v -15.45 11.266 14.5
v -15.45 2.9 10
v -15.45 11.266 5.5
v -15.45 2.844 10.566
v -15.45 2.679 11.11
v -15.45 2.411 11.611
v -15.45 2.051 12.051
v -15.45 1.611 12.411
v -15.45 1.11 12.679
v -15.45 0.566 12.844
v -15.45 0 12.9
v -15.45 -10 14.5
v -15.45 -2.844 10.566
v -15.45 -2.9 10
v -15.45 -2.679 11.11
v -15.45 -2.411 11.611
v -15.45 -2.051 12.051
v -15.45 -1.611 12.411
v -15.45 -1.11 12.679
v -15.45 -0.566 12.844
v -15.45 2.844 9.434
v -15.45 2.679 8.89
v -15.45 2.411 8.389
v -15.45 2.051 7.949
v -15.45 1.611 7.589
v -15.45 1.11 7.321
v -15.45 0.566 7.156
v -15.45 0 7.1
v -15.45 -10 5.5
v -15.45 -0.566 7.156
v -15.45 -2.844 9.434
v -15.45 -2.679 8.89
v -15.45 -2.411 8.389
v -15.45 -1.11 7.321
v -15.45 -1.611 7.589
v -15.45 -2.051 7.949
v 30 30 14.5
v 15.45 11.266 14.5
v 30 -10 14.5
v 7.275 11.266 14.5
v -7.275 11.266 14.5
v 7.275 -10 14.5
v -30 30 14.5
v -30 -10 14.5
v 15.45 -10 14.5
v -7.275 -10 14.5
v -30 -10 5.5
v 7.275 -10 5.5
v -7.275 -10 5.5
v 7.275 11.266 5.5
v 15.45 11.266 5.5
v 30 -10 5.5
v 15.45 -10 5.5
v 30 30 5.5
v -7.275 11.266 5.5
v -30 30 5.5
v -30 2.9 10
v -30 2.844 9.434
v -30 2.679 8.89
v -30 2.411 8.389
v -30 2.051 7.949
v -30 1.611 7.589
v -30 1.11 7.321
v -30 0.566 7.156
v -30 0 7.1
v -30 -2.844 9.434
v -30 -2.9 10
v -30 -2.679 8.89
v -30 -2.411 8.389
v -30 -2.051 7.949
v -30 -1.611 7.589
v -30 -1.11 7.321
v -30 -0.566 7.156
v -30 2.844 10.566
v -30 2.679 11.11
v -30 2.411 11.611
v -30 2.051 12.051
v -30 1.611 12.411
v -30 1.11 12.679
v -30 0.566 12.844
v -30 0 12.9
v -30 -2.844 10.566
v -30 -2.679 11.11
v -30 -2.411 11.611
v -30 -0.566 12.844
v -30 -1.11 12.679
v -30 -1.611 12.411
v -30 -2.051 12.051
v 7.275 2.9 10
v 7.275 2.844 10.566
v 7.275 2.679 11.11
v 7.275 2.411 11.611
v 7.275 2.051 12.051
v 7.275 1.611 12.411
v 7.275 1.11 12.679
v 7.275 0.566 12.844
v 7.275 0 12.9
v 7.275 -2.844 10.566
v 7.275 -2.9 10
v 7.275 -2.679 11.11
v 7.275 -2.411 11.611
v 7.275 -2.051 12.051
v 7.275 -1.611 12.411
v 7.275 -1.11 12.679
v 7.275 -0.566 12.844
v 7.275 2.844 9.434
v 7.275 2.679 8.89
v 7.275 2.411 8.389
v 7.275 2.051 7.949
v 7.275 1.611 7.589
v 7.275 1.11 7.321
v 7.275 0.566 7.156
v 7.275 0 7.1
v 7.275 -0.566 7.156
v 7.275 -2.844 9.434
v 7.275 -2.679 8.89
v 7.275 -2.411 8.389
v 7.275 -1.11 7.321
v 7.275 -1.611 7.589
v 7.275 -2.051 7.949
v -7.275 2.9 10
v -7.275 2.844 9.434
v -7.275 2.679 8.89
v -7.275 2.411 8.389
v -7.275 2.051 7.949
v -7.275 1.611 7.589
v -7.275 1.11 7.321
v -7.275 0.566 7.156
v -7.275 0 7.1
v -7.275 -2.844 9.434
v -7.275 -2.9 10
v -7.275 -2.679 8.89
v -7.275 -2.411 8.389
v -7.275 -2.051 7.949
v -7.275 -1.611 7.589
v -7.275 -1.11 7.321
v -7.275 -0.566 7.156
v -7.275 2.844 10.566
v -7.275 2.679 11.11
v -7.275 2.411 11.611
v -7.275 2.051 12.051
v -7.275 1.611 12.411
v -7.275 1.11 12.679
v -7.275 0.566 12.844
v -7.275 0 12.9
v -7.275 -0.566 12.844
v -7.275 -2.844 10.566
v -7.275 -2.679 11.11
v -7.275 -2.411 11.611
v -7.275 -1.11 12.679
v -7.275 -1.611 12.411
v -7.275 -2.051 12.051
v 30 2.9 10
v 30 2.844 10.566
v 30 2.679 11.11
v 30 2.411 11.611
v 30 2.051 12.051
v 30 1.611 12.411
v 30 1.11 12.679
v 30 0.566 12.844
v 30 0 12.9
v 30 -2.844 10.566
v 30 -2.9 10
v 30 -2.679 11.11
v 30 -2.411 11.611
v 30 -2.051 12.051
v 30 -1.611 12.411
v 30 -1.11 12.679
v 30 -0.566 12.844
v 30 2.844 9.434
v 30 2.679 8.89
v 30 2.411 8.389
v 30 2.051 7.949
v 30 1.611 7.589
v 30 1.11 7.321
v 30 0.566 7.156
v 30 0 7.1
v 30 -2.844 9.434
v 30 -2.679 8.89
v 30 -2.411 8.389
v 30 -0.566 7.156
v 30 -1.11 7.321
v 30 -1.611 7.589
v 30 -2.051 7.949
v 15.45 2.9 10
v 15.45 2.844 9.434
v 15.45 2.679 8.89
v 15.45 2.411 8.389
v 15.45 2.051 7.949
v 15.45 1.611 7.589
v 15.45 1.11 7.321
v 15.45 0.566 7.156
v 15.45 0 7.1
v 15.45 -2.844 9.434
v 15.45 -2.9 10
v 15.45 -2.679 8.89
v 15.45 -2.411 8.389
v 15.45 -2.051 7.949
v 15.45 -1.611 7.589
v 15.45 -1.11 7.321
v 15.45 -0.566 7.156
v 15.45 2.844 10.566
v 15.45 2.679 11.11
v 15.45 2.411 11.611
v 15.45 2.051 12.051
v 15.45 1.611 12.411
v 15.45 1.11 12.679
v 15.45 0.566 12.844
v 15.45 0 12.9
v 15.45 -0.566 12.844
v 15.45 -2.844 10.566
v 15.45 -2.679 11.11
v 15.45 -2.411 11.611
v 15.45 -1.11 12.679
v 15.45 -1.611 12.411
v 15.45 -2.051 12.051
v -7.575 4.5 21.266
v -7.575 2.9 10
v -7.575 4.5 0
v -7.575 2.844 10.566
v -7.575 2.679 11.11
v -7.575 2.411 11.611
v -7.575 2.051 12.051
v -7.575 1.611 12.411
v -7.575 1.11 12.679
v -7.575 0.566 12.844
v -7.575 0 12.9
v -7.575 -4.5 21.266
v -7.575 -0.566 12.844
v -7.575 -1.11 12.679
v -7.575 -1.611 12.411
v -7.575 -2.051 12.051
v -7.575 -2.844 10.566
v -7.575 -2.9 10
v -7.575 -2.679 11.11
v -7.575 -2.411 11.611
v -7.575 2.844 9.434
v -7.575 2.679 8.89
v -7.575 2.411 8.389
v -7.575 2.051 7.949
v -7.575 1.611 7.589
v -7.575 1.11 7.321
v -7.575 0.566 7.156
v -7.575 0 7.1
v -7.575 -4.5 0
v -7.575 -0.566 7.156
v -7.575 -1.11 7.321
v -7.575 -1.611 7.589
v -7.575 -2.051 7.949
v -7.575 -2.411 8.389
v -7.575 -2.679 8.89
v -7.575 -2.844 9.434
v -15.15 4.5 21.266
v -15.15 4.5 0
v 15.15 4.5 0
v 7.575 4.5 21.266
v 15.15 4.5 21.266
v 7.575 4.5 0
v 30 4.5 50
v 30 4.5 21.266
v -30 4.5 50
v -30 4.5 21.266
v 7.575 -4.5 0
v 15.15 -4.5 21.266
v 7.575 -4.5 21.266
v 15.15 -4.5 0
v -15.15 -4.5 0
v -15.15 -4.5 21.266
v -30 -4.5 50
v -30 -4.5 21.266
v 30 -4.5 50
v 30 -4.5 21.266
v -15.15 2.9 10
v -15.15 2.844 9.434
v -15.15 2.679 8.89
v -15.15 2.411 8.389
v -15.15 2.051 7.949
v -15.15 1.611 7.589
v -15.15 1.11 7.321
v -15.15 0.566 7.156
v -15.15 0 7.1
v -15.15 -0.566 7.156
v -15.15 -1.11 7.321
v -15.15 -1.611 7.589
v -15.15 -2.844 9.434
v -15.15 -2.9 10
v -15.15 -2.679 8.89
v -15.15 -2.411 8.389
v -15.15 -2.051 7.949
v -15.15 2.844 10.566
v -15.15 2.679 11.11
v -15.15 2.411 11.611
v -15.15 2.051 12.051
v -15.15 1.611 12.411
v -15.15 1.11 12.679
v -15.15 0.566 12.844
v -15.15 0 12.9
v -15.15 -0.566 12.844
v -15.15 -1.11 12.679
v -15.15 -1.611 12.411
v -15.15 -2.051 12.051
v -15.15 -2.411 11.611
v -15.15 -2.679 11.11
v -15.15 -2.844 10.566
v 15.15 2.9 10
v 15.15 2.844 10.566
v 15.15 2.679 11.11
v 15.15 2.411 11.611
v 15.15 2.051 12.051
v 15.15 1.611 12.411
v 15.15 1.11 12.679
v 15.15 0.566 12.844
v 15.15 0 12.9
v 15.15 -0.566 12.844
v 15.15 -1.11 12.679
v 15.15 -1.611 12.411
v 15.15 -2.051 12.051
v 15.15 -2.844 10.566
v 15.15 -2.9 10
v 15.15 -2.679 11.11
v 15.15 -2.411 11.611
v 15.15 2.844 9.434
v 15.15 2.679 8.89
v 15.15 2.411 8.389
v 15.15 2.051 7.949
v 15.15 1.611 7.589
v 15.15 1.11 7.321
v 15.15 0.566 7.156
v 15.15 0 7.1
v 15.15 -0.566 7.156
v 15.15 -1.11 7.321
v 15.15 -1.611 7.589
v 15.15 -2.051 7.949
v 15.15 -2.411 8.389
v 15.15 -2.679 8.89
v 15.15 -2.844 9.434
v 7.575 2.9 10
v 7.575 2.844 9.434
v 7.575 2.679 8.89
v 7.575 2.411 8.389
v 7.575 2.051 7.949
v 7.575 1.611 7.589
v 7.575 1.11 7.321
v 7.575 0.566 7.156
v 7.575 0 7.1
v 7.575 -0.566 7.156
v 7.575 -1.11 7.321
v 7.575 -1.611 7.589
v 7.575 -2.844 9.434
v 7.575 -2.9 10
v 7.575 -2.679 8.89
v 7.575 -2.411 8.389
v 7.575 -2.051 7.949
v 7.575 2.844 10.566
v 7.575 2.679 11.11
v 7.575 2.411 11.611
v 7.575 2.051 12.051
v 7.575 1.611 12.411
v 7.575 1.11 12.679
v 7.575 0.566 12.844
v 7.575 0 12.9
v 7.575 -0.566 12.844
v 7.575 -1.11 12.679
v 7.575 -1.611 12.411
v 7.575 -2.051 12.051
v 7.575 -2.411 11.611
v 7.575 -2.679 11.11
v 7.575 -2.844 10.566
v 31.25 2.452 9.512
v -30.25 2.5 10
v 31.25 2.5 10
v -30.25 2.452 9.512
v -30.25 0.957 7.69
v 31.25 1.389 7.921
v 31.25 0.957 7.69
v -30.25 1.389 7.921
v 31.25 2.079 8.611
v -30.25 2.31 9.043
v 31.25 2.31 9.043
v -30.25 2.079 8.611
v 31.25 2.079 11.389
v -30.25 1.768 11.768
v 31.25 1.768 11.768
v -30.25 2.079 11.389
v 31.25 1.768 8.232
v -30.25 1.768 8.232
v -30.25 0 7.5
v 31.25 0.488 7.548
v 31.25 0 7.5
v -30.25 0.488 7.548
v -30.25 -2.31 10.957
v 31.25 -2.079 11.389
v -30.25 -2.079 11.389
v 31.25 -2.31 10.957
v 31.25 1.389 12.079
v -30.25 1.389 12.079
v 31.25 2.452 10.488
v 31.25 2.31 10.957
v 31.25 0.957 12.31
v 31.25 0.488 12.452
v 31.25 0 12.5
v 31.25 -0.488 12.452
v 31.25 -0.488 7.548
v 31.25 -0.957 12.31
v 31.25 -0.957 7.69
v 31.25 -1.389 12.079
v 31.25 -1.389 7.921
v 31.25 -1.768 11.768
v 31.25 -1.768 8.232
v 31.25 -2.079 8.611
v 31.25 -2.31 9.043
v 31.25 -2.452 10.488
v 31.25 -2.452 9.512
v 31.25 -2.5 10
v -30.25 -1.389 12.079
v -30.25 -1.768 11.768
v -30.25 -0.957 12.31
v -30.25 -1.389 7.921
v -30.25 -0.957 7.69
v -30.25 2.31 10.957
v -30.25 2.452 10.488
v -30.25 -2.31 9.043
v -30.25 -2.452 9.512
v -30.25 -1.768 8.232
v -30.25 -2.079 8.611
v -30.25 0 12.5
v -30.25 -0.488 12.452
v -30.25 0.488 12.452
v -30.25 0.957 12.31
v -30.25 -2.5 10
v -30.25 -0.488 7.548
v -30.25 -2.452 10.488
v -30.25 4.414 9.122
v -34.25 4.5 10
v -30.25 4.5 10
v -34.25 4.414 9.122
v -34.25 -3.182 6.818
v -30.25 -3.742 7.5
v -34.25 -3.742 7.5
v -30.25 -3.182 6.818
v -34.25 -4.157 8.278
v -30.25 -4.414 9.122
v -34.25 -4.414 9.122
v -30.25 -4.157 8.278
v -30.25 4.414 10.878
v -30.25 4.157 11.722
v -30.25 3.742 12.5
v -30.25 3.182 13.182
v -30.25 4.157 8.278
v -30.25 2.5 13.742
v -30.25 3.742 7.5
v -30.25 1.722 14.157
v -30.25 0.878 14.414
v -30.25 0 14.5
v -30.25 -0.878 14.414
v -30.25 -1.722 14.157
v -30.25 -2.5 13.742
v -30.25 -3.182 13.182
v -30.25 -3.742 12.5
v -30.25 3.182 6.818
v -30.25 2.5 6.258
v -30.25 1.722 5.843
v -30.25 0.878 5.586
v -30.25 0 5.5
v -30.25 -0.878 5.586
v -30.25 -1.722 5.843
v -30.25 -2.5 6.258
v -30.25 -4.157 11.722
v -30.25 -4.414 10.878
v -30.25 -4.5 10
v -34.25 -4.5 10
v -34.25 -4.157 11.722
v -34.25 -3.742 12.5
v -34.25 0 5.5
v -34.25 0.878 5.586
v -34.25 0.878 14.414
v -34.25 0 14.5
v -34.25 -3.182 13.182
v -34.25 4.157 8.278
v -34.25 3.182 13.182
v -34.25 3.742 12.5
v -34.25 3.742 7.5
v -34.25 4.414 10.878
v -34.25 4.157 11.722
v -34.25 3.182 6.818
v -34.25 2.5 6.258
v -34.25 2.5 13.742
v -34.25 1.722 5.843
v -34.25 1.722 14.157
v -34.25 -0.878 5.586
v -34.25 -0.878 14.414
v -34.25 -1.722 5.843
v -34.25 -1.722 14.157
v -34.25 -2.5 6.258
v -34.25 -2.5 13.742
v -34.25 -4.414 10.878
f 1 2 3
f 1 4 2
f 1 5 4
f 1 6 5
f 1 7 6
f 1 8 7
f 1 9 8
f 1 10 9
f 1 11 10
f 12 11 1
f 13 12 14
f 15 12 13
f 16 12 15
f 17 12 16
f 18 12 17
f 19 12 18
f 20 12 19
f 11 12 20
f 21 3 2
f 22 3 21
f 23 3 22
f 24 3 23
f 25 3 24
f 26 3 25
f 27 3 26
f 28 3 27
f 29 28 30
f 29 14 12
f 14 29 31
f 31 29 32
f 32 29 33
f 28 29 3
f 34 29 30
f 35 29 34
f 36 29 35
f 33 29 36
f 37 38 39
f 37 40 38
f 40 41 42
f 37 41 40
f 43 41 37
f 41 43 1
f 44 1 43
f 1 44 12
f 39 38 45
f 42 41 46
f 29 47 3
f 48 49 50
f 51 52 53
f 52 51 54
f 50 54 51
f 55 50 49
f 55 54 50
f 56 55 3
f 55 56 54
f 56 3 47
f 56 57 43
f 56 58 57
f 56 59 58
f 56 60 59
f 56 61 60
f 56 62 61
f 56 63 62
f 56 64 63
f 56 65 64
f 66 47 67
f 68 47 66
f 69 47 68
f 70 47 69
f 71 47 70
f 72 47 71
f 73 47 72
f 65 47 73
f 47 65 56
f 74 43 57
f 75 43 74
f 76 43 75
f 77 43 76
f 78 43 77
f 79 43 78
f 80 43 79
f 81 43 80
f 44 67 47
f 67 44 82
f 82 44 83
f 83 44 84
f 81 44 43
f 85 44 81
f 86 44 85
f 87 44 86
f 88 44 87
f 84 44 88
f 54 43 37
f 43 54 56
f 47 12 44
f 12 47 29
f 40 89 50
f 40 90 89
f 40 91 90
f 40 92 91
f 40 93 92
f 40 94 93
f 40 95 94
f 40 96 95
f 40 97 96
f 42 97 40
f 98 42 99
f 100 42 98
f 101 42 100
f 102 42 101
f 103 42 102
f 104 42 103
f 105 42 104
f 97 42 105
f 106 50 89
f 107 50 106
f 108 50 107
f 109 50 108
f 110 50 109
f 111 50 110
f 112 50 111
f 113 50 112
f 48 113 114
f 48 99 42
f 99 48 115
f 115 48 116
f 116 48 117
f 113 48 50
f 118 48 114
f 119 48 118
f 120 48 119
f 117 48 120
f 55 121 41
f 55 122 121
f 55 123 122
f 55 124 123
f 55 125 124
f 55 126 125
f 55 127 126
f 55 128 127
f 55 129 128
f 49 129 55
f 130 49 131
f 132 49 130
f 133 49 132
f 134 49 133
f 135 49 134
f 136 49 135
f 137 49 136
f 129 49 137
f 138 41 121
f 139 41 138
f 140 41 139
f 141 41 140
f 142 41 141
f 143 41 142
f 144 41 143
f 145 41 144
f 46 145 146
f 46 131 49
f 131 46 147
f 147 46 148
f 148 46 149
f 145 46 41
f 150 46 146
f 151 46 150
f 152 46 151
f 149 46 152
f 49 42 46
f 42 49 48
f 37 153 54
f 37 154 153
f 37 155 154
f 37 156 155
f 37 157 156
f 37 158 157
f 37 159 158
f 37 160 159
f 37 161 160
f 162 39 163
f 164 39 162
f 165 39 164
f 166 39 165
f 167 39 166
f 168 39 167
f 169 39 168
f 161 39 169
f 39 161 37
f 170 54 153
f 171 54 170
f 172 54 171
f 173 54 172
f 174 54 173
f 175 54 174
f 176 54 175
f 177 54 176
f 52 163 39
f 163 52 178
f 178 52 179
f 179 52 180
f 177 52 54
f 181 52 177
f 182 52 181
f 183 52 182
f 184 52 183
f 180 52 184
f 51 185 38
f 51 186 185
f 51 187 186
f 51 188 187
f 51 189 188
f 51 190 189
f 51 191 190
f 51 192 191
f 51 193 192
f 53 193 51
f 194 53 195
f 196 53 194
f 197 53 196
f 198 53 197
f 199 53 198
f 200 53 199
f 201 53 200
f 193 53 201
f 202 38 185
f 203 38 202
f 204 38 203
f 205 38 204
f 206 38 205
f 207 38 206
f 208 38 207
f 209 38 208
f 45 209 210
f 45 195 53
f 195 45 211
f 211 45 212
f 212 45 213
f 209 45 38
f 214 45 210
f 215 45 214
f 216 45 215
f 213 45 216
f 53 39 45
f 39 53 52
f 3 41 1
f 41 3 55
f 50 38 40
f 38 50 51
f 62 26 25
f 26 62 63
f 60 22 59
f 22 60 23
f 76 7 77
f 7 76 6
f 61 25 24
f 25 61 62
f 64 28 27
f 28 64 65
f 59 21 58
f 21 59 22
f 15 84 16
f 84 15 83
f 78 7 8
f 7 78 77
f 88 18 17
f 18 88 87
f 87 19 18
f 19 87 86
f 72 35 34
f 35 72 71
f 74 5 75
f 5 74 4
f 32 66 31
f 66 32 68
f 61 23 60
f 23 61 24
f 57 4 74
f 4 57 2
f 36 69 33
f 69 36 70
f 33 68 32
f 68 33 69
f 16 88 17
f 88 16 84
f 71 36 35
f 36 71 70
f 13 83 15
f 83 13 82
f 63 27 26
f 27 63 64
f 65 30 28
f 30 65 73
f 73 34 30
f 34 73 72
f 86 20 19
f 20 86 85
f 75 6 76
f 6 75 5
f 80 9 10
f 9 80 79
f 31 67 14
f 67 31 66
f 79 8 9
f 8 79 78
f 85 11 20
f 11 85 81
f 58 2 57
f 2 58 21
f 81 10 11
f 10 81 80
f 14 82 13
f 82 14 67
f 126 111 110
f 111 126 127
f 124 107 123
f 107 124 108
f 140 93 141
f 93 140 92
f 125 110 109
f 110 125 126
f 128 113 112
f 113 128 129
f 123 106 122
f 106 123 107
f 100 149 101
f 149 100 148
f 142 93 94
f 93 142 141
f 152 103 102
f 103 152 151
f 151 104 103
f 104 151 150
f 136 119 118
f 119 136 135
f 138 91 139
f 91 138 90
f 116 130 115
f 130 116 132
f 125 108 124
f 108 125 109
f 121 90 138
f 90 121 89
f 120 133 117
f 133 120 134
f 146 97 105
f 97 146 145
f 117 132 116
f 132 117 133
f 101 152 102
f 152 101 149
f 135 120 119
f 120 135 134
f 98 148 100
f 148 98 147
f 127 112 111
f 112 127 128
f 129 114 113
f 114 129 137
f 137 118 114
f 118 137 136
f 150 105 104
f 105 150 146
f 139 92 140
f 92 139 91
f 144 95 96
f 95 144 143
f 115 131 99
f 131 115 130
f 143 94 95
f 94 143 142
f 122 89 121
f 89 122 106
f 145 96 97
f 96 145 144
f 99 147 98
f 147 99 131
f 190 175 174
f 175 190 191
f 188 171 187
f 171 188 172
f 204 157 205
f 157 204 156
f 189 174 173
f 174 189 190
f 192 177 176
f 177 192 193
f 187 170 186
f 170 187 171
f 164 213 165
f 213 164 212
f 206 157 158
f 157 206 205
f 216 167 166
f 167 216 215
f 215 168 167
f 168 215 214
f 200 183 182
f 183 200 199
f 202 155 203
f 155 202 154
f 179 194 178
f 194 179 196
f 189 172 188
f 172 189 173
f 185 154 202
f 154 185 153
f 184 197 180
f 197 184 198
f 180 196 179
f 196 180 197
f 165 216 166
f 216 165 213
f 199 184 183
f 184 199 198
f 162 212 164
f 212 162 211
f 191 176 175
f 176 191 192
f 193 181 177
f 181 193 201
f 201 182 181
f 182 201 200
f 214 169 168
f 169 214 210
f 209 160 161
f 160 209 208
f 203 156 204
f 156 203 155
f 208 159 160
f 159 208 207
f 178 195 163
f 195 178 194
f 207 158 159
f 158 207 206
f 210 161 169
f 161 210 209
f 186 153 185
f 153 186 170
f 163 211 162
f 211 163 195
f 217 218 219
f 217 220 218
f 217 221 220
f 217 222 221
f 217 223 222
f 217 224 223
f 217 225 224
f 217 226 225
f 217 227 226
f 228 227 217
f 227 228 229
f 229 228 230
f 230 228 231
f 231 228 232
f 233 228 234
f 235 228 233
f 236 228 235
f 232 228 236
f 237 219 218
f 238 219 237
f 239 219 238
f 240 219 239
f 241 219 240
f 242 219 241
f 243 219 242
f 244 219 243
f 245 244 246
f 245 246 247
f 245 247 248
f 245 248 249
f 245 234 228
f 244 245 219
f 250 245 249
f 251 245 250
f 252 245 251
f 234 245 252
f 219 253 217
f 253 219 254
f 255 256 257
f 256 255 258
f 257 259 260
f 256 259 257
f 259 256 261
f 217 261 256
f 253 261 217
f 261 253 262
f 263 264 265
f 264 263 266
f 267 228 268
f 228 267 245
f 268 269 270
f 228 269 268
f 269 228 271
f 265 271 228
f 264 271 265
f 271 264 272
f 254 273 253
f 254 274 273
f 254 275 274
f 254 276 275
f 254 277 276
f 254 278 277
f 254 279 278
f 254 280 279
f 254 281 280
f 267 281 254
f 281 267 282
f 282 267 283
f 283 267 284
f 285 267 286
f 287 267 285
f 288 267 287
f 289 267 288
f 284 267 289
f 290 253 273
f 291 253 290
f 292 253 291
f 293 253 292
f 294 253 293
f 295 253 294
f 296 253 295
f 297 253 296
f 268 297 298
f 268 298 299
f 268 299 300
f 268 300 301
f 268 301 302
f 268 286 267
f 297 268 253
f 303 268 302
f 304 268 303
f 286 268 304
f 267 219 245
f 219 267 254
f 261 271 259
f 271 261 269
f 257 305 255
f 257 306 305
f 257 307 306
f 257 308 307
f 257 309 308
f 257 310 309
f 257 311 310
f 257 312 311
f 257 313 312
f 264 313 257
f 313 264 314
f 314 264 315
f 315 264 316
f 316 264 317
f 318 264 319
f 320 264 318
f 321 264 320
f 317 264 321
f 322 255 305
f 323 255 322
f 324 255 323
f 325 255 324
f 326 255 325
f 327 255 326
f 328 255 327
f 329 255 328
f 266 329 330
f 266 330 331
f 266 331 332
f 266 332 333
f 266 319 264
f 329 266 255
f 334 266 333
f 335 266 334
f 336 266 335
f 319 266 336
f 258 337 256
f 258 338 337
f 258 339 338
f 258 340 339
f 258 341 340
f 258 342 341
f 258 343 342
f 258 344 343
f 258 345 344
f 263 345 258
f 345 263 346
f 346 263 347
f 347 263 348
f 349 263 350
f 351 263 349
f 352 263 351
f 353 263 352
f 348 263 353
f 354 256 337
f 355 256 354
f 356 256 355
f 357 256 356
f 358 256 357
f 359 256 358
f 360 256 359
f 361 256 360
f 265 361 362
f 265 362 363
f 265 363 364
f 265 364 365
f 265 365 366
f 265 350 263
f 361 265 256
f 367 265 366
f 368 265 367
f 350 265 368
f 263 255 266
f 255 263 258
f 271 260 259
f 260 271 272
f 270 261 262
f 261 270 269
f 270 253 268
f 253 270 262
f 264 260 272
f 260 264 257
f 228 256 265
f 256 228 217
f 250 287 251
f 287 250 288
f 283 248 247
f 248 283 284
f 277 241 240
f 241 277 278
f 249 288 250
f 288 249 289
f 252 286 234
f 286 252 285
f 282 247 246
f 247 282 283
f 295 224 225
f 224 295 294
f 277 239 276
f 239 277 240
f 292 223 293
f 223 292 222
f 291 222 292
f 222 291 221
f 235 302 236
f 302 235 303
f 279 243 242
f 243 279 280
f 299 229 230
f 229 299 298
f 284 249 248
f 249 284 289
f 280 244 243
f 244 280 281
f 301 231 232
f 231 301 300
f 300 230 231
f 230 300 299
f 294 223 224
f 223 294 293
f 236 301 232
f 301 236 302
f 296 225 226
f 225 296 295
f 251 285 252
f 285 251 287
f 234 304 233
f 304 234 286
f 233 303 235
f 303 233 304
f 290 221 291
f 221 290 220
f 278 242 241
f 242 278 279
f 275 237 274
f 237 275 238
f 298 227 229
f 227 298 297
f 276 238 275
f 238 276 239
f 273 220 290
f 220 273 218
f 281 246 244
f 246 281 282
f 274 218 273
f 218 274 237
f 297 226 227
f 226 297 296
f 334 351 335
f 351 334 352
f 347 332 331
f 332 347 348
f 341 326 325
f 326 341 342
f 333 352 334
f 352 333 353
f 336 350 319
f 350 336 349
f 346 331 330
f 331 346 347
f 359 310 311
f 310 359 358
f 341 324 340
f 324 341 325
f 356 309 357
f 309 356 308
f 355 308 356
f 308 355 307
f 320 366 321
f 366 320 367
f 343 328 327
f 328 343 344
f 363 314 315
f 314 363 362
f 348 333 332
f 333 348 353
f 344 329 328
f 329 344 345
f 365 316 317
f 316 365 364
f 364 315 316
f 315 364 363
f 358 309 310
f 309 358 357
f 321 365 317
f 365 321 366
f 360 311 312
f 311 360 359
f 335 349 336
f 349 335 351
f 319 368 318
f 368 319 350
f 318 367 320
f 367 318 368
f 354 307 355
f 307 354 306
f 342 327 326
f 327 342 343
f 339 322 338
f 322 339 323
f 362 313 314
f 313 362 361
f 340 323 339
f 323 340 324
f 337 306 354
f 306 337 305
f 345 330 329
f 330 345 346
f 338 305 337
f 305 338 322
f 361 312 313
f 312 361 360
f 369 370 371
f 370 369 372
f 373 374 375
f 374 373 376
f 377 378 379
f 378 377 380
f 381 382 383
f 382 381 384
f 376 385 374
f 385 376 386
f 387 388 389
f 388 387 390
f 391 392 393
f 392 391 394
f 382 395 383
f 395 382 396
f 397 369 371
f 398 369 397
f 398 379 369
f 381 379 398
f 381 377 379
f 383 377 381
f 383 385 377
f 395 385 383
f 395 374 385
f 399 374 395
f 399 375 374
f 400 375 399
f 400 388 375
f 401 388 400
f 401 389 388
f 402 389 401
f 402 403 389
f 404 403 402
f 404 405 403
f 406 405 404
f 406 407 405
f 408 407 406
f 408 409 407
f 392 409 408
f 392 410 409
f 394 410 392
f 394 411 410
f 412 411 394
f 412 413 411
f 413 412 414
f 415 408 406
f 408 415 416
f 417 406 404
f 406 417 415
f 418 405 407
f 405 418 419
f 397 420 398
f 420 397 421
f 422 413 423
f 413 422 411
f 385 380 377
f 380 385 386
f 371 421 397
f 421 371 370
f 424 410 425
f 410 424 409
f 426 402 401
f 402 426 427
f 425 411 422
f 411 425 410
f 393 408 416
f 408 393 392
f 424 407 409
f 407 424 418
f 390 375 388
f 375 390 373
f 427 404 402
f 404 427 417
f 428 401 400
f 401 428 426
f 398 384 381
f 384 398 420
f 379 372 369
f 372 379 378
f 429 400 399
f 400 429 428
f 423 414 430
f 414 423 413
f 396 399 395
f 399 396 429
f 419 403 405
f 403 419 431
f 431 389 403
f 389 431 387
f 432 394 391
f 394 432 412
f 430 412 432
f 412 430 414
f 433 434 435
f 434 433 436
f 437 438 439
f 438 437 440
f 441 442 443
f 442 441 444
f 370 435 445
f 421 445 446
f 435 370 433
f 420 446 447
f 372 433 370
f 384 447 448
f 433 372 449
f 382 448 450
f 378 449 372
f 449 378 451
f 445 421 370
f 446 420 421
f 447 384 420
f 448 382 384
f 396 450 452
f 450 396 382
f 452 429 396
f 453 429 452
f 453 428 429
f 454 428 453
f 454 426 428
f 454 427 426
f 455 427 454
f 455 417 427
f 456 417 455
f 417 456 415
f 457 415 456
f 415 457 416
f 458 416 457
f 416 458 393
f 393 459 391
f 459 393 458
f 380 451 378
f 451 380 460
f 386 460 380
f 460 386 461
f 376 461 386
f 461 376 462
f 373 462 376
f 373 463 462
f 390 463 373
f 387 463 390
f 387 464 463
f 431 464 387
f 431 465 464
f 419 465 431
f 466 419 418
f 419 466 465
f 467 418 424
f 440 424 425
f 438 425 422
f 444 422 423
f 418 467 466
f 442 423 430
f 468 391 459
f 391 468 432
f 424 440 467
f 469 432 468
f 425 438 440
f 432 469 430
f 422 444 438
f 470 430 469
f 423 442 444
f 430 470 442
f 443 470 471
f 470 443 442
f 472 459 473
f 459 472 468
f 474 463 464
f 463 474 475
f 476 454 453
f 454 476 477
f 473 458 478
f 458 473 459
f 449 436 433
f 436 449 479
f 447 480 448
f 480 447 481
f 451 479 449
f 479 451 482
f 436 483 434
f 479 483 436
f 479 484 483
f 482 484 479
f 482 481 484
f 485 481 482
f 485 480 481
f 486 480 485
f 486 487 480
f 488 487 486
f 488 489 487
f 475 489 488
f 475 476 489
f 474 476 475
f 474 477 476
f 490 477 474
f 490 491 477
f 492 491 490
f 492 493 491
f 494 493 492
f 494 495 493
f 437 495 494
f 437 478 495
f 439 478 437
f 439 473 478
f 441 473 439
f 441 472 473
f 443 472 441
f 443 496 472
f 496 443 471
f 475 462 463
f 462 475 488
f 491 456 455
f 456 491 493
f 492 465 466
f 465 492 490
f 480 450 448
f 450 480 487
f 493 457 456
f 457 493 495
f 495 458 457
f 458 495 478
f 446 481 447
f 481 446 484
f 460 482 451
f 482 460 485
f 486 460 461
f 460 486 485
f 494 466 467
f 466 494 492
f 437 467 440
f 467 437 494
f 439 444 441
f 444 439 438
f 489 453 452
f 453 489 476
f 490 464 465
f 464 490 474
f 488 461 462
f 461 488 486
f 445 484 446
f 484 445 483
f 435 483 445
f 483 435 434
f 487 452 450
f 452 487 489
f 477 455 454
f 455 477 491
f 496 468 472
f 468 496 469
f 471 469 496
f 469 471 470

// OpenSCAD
$fn = 32;

// ------------------------------------------------------------------------
// Butt hinge: hinge 60 mm, leaf swung 270 deg
// Every part is its own module, assembly() places every instance.
// ------------------------------------------------------------------------

// --- part 1 ---
module hinge_base() {
  difference() {
    union() {
      translate([-30, -10, -4.5]) cube([14.55, 40, 9]);
      translate([-7.275, -10, -4.5]) cube([14.55, 40, 9]);
      translate([15.45, -10, -4.5]) cube([14.55, 40, 9]);
      translate([-30, 11.266, -4.5]) cube([60, 18.734, 9]);
    }
    translate([-22.725, 0, 0]) rotate([0, 90, 0]) cylinder(h = 16.55, d = 5.8, center = true);
    translate([0, 0, 0]) rotate([0, 90, 0]) cylinder(h = 16.55, d = 5.8, center = true);
    translate([22.725, 0, 0]) rotate([0, 90, 0]) cylinder(h = 16.55, d = 5.8, center = true);
  }
}

// --- part 2 ---
module hinge_mover() {
  difference() {
    union() {
      translate([-15.15, -40, -4.5]) cube([7.575, 50, 9]);
      translate([7.575, -40, -4.5]) cube([7.575, 50, 9]);
      translate([-30, -40, -4.5]) cube([60, 28.734, 9]);
    }
    translate([-11.362, 0, 0]) rotate([0, 90, 0]) cylinder(h = 9.575, d = 5.8, center = true);
    translate([11.362, 0, 0]) rotate([0, 90, 0]) cylinder(h = 9.575, d = 5.8, center = true);
  }
}

// --- part 3 ---
module hinge_pin() {
  rotate([0, 90, 0]) cylinder(h = 62.5, d = 5, center = true);
  translate([-34.25, 0, 0]) rotate([0, 90, 0]) cylinder(h = 4, d = 9);
}

// --- assembly ---
module assembly() {
  color([0.80, 0.24, 0.20]) translate([0, 0, 10]) rotate([0, 0, 0]) hinge_base();
  color([0.20, 0.45, 0.75]) translate([0, 0, 10]) rotate([270, 0, 0]) hinge_mover();
  color([0.25, 0.62, 0.32]) translate([0, 0, 10]) rotate([0, 0, 0]) hinge_pin();
}

assembly();
